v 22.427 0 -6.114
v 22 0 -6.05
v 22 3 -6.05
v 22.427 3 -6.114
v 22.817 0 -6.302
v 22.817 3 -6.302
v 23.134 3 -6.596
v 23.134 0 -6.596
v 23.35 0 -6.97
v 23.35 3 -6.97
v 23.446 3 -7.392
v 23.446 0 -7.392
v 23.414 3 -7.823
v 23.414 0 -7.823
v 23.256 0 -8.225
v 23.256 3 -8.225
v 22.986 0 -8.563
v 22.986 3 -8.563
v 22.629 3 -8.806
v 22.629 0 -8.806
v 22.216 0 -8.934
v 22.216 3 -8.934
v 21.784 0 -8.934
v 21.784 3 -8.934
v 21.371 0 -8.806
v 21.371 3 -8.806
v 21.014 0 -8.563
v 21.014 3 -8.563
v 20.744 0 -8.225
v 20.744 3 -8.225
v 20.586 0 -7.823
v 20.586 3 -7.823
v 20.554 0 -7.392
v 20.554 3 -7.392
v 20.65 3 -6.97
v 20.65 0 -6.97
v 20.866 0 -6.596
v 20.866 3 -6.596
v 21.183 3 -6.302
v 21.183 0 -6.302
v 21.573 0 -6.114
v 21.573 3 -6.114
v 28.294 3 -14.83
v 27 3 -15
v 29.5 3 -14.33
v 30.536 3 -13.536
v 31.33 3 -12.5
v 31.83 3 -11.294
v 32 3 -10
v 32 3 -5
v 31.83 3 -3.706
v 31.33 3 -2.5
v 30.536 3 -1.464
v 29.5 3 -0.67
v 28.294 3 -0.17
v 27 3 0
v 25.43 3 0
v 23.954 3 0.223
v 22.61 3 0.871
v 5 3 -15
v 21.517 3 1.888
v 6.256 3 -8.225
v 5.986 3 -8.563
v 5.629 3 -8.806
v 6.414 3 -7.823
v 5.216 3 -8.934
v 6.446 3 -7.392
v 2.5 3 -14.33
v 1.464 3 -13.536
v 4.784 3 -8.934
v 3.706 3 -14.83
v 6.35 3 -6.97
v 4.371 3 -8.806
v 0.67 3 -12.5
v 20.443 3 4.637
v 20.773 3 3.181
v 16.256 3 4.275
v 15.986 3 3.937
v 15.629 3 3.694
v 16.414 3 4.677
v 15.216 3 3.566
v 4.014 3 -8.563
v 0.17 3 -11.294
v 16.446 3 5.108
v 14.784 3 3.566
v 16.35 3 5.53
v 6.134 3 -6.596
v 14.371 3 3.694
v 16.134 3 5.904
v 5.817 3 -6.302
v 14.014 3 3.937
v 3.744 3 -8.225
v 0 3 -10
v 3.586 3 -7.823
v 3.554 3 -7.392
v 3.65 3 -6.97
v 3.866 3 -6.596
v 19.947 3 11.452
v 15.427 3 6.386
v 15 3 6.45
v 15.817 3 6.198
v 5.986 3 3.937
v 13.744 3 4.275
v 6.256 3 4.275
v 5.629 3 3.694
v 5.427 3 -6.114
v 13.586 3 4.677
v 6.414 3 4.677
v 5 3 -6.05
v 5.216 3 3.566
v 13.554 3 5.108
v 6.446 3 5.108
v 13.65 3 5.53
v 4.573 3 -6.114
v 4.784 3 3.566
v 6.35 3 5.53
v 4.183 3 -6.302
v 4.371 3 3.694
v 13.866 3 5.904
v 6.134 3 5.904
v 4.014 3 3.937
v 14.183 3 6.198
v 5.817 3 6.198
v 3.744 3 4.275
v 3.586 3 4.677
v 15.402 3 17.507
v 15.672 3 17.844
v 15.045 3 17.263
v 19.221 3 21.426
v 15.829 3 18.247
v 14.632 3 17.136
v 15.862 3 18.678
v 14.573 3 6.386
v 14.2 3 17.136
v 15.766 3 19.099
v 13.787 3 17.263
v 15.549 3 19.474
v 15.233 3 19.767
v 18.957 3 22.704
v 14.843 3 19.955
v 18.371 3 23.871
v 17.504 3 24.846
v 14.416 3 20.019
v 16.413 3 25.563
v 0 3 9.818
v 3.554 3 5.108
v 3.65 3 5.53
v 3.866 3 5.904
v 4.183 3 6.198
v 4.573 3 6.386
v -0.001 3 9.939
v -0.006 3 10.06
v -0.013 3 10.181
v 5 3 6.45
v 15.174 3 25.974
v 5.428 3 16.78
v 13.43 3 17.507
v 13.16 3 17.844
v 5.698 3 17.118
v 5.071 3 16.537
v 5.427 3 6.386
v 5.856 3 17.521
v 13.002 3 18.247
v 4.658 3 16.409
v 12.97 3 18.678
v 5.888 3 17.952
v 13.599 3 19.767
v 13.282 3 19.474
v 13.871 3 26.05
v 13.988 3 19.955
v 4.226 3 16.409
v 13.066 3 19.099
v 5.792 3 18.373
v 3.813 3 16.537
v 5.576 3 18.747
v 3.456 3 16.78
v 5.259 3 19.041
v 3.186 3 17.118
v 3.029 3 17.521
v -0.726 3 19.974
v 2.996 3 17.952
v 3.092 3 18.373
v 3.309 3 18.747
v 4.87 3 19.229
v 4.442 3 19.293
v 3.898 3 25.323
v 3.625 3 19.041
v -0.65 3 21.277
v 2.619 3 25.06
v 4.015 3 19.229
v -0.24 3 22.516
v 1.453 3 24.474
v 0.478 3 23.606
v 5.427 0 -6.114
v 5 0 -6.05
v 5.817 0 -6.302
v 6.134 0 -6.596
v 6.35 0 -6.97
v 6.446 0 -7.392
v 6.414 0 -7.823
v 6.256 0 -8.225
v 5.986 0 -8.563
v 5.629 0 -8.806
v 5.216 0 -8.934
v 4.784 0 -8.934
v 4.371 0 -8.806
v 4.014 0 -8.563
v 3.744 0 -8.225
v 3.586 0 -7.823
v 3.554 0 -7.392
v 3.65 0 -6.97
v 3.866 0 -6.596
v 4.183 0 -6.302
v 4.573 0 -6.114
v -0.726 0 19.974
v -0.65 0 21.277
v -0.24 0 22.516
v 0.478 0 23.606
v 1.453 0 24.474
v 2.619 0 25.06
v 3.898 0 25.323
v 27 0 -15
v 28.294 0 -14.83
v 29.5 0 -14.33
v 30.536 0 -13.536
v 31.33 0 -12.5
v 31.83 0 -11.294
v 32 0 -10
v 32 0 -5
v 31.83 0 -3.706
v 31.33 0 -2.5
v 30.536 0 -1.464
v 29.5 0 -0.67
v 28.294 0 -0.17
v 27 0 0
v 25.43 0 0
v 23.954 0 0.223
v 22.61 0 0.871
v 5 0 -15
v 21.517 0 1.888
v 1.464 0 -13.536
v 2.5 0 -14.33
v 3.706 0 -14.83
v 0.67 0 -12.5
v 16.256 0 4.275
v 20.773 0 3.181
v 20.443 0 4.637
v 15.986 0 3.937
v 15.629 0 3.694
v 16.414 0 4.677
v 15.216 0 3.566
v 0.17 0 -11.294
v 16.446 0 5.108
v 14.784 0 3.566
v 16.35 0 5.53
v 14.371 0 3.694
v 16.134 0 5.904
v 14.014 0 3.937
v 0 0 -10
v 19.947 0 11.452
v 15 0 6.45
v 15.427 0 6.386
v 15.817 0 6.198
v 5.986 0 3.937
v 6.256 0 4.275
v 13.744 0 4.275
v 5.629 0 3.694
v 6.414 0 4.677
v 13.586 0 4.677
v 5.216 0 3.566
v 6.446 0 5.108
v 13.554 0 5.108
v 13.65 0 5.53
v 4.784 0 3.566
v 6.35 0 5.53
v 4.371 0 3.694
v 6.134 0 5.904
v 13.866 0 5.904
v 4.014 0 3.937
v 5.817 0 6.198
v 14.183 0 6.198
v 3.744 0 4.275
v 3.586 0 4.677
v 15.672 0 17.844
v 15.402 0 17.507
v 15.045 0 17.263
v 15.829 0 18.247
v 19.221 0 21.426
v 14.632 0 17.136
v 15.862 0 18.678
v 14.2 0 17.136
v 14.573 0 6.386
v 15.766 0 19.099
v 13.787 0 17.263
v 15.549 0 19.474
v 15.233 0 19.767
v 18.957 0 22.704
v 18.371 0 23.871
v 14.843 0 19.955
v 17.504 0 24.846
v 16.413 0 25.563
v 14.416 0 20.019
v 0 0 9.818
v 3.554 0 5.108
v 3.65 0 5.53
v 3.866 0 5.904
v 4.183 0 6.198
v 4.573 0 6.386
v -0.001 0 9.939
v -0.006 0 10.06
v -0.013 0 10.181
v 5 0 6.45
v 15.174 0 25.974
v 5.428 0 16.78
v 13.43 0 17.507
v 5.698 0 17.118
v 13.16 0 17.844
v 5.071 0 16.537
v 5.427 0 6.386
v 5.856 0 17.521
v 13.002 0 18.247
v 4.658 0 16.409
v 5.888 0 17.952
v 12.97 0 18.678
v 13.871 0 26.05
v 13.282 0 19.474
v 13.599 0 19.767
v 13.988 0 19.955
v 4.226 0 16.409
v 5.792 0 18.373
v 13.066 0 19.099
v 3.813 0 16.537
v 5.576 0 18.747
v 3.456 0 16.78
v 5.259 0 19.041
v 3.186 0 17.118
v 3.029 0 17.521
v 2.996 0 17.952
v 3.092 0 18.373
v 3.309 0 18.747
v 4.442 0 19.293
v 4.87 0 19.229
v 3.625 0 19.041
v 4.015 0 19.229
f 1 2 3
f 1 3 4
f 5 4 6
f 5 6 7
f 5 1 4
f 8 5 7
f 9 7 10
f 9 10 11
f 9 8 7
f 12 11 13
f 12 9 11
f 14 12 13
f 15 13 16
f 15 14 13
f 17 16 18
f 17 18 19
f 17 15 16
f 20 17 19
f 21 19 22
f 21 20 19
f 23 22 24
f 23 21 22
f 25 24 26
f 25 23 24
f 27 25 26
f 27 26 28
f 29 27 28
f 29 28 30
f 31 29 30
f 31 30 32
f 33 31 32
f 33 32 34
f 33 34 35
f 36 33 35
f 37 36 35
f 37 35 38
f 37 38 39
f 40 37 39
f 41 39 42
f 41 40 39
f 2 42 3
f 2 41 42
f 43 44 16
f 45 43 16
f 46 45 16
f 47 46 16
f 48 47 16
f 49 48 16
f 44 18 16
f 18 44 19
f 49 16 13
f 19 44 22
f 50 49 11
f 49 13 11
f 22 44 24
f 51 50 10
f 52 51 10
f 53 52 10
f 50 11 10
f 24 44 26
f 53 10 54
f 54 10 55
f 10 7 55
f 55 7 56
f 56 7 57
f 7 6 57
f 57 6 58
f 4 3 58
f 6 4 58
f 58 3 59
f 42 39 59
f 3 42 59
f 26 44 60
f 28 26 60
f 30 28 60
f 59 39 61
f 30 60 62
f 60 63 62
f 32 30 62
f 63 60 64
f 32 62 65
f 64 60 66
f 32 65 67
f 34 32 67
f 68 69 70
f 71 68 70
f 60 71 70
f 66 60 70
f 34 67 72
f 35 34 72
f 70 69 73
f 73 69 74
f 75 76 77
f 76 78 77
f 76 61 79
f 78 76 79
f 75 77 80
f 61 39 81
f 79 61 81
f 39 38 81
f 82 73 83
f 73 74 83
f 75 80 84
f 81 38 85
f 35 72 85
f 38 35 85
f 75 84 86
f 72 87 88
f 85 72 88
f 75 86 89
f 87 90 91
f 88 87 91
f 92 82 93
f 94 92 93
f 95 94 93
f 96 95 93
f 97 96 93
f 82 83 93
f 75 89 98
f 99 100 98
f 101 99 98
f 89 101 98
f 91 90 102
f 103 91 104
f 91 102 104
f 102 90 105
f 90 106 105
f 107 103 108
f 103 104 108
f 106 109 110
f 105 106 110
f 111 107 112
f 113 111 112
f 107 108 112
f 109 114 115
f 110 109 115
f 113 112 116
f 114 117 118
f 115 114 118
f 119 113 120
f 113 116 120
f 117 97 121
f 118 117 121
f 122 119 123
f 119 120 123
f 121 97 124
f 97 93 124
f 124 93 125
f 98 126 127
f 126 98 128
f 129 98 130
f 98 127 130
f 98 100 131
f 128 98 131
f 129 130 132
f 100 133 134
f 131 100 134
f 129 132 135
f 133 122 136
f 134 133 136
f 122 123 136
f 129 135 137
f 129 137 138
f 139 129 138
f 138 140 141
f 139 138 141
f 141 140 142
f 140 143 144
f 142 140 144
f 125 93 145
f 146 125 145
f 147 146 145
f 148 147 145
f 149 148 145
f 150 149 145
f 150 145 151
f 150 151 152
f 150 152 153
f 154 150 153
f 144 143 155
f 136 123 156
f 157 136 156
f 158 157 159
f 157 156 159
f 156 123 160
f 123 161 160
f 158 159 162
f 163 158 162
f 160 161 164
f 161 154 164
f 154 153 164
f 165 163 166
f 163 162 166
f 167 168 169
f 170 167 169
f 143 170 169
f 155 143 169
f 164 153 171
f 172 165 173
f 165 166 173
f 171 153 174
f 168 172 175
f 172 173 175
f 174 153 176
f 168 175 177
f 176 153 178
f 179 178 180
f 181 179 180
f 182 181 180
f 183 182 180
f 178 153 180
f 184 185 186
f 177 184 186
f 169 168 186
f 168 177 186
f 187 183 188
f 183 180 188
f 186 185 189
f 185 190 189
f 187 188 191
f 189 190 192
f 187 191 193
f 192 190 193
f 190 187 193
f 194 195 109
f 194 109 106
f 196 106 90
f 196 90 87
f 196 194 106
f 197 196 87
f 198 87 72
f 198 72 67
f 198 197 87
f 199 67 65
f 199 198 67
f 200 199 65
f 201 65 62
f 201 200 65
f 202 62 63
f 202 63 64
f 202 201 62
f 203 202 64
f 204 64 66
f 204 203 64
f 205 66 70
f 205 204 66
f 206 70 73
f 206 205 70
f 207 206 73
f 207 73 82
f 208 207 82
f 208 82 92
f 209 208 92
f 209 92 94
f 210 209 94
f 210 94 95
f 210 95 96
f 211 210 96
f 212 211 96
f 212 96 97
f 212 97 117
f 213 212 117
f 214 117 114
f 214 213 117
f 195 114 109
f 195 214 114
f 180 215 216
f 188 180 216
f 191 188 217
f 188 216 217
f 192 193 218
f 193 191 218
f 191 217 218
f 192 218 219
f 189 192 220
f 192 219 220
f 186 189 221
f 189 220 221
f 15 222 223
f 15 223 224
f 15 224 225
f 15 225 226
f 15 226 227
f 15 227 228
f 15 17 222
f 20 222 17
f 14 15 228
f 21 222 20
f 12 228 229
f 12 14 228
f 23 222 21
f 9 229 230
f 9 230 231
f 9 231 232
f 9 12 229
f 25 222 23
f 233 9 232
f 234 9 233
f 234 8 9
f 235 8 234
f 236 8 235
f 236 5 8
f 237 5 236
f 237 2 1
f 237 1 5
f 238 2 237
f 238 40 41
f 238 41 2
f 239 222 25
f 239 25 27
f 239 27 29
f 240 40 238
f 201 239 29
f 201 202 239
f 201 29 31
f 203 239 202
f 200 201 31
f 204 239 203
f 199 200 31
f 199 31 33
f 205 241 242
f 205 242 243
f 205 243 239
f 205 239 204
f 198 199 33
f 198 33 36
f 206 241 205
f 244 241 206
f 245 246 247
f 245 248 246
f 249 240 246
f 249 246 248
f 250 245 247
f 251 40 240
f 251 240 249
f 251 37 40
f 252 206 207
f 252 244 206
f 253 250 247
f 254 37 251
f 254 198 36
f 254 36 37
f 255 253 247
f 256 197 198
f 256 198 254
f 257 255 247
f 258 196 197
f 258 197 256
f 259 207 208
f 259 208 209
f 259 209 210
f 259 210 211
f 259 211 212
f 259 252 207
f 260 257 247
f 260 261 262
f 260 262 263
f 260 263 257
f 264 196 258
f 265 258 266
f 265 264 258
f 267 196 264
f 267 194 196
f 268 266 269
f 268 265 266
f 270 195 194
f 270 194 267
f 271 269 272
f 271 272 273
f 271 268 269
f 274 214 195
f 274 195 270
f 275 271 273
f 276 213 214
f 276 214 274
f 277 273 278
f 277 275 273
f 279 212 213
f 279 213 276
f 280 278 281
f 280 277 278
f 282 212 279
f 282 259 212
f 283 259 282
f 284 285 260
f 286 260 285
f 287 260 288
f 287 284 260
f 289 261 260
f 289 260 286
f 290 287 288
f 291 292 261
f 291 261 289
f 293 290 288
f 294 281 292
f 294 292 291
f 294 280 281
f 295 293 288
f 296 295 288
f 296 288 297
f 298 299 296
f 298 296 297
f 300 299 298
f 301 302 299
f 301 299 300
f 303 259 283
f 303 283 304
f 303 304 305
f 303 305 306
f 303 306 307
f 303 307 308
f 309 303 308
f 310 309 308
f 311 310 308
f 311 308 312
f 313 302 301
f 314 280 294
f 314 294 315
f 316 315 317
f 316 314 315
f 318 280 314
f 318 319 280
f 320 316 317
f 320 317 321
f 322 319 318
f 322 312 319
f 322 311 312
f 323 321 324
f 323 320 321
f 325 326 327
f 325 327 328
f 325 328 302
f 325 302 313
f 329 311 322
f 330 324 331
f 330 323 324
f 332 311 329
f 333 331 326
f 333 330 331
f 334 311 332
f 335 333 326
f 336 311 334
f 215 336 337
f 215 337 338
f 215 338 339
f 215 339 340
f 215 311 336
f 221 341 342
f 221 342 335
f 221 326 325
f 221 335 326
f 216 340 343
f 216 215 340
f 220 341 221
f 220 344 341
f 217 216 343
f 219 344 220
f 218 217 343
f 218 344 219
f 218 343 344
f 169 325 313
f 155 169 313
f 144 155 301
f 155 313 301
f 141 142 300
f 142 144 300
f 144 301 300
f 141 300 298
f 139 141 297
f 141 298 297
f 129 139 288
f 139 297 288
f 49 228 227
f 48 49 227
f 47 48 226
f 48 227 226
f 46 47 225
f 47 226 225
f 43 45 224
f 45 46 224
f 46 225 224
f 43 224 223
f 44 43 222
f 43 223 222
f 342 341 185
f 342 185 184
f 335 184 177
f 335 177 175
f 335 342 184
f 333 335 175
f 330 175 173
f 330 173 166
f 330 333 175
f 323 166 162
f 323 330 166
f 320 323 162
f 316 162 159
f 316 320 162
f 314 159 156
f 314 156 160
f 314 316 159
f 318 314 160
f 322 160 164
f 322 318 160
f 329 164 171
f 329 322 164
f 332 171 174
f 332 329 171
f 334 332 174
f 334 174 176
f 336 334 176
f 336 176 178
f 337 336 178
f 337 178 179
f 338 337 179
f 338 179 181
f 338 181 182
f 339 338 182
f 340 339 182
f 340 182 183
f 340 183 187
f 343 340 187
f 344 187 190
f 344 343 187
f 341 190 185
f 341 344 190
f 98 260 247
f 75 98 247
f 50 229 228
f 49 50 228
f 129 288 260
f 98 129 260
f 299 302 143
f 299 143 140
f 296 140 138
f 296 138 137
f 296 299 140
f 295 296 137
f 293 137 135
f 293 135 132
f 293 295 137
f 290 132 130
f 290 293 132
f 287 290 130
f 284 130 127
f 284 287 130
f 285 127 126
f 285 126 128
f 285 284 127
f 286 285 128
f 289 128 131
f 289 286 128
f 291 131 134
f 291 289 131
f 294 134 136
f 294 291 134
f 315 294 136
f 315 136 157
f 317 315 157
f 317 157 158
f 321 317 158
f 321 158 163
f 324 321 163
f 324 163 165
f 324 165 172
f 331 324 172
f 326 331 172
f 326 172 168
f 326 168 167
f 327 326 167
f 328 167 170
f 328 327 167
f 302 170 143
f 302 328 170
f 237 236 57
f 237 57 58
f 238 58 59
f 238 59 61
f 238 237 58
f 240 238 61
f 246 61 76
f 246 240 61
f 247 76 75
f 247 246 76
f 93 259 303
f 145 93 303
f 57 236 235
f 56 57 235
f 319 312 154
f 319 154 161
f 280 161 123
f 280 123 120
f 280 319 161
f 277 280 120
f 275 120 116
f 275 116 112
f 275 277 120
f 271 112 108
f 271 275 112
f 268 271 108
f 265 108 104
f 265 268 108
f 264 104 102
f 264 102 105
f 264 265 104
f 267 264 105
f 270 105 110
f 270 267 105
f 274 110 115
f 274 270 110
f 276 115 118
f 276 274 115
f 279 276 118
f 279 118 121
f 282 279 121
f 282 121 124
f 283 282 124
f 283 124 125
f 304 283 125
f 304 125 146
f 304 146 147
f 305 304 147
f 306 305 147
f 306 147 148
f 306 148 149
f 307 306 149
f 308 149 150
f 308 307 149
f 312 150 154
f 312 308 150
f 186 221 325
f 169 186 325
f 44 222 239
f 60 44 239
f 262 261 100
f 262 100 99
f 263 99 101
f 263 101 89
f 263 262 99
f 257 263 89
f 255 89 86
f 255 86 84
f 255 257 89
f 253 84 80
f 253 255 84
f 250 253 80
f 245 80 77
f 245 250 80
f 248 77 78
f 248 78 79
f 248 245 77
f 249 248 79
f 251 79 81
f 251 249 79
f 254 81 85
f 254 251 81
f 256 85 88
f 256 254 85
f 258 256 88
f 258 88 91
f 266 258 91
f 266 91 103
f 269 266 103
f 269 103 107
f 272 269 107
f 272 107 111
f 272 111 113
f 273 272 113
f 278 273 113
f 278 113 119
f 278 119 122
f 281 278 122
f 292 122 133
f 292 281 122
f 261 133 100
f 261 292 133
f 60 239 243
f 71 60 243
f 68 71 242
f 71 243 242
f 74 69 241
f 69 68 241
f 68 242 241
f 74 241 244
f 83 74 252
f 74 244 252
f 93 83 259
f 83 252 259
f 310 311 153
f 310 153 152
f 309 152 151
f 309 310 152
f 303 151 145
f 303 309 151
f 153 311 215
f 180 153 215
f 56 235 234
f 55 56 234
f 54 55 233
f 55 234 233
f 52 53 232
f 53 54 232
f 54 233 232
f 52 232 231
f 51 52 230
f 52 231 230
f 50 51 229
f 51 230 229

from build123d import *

# Parameters (mm, degrees)
SKETCH_1_R      = 1.45
EXTRUDE_1_DEPTH = 3
FILLET_1_R      = 5


with BuildPart() as part:
    # 草图1 → 凸台-拉伸1 (new body)
    with BuildSketch(Plane(origin=(0, 0, 0), x_dir=(1, 0, 0), z_dir=(0, 1, 0))):
        Polygon((0, 0), (0, -10), (-1.089249024, -24.960398944), (18.857949568, -26.412730977), (19.947198592, -11.452332033), (20.781029397, 0), (32, 0), (32, 15), (20.781029397, 15), (0, 15), align=None)
        with Locations(Location((5, 7.5, 0), (0, 0, 270))):
            Circle(SKETCH_1_R, mode=Mode.SUBTRACT)
        with Locations(Location((22, 7.5, 0), (0, 0, 270))):
            Circle(SKETCH_1_R, mode=Mode.SUBTRACT)
        with Locations(Location((4.442175136, -17.84328248, 0), (0, 0, 270))):
            Circle(SKETCH_1_R, mode=Mode.SUBTRACT)
        with Locations(Location((14.415774432, -18.569448496, 0), (0, 0, 270))):
            Circle(SKETCH_1_R, mode=Mode.SUBTRACT)
        with Locations(Location((5, -5, 0), (0, 0, 270))):
            Circle(SKETCH_1_R, mode=Mode.SUBTRACT)
        with Locations(Location((15, -5, 0), (0, 0, 270))):
            Circle(SKETCH_1_R, mode=Mode.SUBTRACT)
    extrude(amount=EXTRUDE_1_DEPTH)

    # 圆角1
    # the kernel refuses this fillet: 5 mm, written as the material it adds along each edge
    with BuildSketch(Plane(origin=(20.781029397, 0, 0), x_dir=(1, 0, 0), z_dir=(0, 1, 0))) as fillet_1_piece_1:
        with BuildLine():
            CenterArc((FILLET_1_R * 0.929838236779, -FILLET_1_R), FILLET_1_R, 90, 85.835709886)
            Line((-FILLET_1_R * 0.0675216928189, -FILLET_1_R * 0.927383398372), (0, 0))
            Line((0, 0), (FILLET_1_R * 0.929838236779, 0))
        make_face()
    extrude(amount=3)
    with BuildSketch(Plane(origin=(0, 0, 10), x_dir=(0, 0, -1), z_dir=(0, 1, 0))) as fillet_1_piece_2:
        with BuildLine():
            CenterArc((FILLET_1_R * 0.0363562923998, FILLET_1_R), FILLET_1_R, 265.835709886, 4.164290114)
            Line((-FILLET_1_R * 0.0362603092284, FILLET_1_R * 0.00264007040188), (0, 0))
            Line((0, 0), (FILLET_1_R * 0.0363562923998, 0))
        make_face()
    extrude(amount=3)
    # the kernel refuses this fillet: 5 mm, written as the material it takes off along each edge
    with BuildSketch(Plane(origin=(0, -12.5, -15), x_dir=(0, 0, 1), z_dir=(0, 1, 0)), Plane(origin=(32, -12.5, -15), x_dir=(-1, 0, 0), z_dir=(0, 1, 0))) as fillet_1_2_piece_1:
        with BuildLine():
            CenterArc((FILLET_1_R, FILLET_1_R), FILLET_1_R, 180, 90)
            Line((0, FILLET_1_R), (0, 0))
            Line((0, 0), (FILLET_1_R, 0))
        make_face()
    extrude(amount=28, mode=Mode.SUBTRACT)
    with BuildSketch(Plane(origin=(32, -12.5, 0), x_dir=(-1, 0, 0), z_dir=(0, 1, 0)), Plane(origin=(18.857949568, -12.5, 26.412730977), x_dir=(-0.9973599295981169, 0, -0.0726166016282719), z_dir=(0, 1, 0)), Plane(origin=(-1.089249024, -12.5, 24.960398944), x_dir=(0.07261660162819664, 0, -0.9973599295981225), z_dir=(0, 1, 0))) as fillet_1_2_piece_2:
        with BuildLine():
            CenterArc((FILLET_1_R, -FILLET_1_R), FILLET_1_R, 90, 90)
            Line((0, -FILLET_1_R), (0, 0))
            Line((0, 0), (FILLET_1_R, 0))
        make_face()
    extrude(amount=28, mode=Mode.SUBTRACT)


solid = part.part
